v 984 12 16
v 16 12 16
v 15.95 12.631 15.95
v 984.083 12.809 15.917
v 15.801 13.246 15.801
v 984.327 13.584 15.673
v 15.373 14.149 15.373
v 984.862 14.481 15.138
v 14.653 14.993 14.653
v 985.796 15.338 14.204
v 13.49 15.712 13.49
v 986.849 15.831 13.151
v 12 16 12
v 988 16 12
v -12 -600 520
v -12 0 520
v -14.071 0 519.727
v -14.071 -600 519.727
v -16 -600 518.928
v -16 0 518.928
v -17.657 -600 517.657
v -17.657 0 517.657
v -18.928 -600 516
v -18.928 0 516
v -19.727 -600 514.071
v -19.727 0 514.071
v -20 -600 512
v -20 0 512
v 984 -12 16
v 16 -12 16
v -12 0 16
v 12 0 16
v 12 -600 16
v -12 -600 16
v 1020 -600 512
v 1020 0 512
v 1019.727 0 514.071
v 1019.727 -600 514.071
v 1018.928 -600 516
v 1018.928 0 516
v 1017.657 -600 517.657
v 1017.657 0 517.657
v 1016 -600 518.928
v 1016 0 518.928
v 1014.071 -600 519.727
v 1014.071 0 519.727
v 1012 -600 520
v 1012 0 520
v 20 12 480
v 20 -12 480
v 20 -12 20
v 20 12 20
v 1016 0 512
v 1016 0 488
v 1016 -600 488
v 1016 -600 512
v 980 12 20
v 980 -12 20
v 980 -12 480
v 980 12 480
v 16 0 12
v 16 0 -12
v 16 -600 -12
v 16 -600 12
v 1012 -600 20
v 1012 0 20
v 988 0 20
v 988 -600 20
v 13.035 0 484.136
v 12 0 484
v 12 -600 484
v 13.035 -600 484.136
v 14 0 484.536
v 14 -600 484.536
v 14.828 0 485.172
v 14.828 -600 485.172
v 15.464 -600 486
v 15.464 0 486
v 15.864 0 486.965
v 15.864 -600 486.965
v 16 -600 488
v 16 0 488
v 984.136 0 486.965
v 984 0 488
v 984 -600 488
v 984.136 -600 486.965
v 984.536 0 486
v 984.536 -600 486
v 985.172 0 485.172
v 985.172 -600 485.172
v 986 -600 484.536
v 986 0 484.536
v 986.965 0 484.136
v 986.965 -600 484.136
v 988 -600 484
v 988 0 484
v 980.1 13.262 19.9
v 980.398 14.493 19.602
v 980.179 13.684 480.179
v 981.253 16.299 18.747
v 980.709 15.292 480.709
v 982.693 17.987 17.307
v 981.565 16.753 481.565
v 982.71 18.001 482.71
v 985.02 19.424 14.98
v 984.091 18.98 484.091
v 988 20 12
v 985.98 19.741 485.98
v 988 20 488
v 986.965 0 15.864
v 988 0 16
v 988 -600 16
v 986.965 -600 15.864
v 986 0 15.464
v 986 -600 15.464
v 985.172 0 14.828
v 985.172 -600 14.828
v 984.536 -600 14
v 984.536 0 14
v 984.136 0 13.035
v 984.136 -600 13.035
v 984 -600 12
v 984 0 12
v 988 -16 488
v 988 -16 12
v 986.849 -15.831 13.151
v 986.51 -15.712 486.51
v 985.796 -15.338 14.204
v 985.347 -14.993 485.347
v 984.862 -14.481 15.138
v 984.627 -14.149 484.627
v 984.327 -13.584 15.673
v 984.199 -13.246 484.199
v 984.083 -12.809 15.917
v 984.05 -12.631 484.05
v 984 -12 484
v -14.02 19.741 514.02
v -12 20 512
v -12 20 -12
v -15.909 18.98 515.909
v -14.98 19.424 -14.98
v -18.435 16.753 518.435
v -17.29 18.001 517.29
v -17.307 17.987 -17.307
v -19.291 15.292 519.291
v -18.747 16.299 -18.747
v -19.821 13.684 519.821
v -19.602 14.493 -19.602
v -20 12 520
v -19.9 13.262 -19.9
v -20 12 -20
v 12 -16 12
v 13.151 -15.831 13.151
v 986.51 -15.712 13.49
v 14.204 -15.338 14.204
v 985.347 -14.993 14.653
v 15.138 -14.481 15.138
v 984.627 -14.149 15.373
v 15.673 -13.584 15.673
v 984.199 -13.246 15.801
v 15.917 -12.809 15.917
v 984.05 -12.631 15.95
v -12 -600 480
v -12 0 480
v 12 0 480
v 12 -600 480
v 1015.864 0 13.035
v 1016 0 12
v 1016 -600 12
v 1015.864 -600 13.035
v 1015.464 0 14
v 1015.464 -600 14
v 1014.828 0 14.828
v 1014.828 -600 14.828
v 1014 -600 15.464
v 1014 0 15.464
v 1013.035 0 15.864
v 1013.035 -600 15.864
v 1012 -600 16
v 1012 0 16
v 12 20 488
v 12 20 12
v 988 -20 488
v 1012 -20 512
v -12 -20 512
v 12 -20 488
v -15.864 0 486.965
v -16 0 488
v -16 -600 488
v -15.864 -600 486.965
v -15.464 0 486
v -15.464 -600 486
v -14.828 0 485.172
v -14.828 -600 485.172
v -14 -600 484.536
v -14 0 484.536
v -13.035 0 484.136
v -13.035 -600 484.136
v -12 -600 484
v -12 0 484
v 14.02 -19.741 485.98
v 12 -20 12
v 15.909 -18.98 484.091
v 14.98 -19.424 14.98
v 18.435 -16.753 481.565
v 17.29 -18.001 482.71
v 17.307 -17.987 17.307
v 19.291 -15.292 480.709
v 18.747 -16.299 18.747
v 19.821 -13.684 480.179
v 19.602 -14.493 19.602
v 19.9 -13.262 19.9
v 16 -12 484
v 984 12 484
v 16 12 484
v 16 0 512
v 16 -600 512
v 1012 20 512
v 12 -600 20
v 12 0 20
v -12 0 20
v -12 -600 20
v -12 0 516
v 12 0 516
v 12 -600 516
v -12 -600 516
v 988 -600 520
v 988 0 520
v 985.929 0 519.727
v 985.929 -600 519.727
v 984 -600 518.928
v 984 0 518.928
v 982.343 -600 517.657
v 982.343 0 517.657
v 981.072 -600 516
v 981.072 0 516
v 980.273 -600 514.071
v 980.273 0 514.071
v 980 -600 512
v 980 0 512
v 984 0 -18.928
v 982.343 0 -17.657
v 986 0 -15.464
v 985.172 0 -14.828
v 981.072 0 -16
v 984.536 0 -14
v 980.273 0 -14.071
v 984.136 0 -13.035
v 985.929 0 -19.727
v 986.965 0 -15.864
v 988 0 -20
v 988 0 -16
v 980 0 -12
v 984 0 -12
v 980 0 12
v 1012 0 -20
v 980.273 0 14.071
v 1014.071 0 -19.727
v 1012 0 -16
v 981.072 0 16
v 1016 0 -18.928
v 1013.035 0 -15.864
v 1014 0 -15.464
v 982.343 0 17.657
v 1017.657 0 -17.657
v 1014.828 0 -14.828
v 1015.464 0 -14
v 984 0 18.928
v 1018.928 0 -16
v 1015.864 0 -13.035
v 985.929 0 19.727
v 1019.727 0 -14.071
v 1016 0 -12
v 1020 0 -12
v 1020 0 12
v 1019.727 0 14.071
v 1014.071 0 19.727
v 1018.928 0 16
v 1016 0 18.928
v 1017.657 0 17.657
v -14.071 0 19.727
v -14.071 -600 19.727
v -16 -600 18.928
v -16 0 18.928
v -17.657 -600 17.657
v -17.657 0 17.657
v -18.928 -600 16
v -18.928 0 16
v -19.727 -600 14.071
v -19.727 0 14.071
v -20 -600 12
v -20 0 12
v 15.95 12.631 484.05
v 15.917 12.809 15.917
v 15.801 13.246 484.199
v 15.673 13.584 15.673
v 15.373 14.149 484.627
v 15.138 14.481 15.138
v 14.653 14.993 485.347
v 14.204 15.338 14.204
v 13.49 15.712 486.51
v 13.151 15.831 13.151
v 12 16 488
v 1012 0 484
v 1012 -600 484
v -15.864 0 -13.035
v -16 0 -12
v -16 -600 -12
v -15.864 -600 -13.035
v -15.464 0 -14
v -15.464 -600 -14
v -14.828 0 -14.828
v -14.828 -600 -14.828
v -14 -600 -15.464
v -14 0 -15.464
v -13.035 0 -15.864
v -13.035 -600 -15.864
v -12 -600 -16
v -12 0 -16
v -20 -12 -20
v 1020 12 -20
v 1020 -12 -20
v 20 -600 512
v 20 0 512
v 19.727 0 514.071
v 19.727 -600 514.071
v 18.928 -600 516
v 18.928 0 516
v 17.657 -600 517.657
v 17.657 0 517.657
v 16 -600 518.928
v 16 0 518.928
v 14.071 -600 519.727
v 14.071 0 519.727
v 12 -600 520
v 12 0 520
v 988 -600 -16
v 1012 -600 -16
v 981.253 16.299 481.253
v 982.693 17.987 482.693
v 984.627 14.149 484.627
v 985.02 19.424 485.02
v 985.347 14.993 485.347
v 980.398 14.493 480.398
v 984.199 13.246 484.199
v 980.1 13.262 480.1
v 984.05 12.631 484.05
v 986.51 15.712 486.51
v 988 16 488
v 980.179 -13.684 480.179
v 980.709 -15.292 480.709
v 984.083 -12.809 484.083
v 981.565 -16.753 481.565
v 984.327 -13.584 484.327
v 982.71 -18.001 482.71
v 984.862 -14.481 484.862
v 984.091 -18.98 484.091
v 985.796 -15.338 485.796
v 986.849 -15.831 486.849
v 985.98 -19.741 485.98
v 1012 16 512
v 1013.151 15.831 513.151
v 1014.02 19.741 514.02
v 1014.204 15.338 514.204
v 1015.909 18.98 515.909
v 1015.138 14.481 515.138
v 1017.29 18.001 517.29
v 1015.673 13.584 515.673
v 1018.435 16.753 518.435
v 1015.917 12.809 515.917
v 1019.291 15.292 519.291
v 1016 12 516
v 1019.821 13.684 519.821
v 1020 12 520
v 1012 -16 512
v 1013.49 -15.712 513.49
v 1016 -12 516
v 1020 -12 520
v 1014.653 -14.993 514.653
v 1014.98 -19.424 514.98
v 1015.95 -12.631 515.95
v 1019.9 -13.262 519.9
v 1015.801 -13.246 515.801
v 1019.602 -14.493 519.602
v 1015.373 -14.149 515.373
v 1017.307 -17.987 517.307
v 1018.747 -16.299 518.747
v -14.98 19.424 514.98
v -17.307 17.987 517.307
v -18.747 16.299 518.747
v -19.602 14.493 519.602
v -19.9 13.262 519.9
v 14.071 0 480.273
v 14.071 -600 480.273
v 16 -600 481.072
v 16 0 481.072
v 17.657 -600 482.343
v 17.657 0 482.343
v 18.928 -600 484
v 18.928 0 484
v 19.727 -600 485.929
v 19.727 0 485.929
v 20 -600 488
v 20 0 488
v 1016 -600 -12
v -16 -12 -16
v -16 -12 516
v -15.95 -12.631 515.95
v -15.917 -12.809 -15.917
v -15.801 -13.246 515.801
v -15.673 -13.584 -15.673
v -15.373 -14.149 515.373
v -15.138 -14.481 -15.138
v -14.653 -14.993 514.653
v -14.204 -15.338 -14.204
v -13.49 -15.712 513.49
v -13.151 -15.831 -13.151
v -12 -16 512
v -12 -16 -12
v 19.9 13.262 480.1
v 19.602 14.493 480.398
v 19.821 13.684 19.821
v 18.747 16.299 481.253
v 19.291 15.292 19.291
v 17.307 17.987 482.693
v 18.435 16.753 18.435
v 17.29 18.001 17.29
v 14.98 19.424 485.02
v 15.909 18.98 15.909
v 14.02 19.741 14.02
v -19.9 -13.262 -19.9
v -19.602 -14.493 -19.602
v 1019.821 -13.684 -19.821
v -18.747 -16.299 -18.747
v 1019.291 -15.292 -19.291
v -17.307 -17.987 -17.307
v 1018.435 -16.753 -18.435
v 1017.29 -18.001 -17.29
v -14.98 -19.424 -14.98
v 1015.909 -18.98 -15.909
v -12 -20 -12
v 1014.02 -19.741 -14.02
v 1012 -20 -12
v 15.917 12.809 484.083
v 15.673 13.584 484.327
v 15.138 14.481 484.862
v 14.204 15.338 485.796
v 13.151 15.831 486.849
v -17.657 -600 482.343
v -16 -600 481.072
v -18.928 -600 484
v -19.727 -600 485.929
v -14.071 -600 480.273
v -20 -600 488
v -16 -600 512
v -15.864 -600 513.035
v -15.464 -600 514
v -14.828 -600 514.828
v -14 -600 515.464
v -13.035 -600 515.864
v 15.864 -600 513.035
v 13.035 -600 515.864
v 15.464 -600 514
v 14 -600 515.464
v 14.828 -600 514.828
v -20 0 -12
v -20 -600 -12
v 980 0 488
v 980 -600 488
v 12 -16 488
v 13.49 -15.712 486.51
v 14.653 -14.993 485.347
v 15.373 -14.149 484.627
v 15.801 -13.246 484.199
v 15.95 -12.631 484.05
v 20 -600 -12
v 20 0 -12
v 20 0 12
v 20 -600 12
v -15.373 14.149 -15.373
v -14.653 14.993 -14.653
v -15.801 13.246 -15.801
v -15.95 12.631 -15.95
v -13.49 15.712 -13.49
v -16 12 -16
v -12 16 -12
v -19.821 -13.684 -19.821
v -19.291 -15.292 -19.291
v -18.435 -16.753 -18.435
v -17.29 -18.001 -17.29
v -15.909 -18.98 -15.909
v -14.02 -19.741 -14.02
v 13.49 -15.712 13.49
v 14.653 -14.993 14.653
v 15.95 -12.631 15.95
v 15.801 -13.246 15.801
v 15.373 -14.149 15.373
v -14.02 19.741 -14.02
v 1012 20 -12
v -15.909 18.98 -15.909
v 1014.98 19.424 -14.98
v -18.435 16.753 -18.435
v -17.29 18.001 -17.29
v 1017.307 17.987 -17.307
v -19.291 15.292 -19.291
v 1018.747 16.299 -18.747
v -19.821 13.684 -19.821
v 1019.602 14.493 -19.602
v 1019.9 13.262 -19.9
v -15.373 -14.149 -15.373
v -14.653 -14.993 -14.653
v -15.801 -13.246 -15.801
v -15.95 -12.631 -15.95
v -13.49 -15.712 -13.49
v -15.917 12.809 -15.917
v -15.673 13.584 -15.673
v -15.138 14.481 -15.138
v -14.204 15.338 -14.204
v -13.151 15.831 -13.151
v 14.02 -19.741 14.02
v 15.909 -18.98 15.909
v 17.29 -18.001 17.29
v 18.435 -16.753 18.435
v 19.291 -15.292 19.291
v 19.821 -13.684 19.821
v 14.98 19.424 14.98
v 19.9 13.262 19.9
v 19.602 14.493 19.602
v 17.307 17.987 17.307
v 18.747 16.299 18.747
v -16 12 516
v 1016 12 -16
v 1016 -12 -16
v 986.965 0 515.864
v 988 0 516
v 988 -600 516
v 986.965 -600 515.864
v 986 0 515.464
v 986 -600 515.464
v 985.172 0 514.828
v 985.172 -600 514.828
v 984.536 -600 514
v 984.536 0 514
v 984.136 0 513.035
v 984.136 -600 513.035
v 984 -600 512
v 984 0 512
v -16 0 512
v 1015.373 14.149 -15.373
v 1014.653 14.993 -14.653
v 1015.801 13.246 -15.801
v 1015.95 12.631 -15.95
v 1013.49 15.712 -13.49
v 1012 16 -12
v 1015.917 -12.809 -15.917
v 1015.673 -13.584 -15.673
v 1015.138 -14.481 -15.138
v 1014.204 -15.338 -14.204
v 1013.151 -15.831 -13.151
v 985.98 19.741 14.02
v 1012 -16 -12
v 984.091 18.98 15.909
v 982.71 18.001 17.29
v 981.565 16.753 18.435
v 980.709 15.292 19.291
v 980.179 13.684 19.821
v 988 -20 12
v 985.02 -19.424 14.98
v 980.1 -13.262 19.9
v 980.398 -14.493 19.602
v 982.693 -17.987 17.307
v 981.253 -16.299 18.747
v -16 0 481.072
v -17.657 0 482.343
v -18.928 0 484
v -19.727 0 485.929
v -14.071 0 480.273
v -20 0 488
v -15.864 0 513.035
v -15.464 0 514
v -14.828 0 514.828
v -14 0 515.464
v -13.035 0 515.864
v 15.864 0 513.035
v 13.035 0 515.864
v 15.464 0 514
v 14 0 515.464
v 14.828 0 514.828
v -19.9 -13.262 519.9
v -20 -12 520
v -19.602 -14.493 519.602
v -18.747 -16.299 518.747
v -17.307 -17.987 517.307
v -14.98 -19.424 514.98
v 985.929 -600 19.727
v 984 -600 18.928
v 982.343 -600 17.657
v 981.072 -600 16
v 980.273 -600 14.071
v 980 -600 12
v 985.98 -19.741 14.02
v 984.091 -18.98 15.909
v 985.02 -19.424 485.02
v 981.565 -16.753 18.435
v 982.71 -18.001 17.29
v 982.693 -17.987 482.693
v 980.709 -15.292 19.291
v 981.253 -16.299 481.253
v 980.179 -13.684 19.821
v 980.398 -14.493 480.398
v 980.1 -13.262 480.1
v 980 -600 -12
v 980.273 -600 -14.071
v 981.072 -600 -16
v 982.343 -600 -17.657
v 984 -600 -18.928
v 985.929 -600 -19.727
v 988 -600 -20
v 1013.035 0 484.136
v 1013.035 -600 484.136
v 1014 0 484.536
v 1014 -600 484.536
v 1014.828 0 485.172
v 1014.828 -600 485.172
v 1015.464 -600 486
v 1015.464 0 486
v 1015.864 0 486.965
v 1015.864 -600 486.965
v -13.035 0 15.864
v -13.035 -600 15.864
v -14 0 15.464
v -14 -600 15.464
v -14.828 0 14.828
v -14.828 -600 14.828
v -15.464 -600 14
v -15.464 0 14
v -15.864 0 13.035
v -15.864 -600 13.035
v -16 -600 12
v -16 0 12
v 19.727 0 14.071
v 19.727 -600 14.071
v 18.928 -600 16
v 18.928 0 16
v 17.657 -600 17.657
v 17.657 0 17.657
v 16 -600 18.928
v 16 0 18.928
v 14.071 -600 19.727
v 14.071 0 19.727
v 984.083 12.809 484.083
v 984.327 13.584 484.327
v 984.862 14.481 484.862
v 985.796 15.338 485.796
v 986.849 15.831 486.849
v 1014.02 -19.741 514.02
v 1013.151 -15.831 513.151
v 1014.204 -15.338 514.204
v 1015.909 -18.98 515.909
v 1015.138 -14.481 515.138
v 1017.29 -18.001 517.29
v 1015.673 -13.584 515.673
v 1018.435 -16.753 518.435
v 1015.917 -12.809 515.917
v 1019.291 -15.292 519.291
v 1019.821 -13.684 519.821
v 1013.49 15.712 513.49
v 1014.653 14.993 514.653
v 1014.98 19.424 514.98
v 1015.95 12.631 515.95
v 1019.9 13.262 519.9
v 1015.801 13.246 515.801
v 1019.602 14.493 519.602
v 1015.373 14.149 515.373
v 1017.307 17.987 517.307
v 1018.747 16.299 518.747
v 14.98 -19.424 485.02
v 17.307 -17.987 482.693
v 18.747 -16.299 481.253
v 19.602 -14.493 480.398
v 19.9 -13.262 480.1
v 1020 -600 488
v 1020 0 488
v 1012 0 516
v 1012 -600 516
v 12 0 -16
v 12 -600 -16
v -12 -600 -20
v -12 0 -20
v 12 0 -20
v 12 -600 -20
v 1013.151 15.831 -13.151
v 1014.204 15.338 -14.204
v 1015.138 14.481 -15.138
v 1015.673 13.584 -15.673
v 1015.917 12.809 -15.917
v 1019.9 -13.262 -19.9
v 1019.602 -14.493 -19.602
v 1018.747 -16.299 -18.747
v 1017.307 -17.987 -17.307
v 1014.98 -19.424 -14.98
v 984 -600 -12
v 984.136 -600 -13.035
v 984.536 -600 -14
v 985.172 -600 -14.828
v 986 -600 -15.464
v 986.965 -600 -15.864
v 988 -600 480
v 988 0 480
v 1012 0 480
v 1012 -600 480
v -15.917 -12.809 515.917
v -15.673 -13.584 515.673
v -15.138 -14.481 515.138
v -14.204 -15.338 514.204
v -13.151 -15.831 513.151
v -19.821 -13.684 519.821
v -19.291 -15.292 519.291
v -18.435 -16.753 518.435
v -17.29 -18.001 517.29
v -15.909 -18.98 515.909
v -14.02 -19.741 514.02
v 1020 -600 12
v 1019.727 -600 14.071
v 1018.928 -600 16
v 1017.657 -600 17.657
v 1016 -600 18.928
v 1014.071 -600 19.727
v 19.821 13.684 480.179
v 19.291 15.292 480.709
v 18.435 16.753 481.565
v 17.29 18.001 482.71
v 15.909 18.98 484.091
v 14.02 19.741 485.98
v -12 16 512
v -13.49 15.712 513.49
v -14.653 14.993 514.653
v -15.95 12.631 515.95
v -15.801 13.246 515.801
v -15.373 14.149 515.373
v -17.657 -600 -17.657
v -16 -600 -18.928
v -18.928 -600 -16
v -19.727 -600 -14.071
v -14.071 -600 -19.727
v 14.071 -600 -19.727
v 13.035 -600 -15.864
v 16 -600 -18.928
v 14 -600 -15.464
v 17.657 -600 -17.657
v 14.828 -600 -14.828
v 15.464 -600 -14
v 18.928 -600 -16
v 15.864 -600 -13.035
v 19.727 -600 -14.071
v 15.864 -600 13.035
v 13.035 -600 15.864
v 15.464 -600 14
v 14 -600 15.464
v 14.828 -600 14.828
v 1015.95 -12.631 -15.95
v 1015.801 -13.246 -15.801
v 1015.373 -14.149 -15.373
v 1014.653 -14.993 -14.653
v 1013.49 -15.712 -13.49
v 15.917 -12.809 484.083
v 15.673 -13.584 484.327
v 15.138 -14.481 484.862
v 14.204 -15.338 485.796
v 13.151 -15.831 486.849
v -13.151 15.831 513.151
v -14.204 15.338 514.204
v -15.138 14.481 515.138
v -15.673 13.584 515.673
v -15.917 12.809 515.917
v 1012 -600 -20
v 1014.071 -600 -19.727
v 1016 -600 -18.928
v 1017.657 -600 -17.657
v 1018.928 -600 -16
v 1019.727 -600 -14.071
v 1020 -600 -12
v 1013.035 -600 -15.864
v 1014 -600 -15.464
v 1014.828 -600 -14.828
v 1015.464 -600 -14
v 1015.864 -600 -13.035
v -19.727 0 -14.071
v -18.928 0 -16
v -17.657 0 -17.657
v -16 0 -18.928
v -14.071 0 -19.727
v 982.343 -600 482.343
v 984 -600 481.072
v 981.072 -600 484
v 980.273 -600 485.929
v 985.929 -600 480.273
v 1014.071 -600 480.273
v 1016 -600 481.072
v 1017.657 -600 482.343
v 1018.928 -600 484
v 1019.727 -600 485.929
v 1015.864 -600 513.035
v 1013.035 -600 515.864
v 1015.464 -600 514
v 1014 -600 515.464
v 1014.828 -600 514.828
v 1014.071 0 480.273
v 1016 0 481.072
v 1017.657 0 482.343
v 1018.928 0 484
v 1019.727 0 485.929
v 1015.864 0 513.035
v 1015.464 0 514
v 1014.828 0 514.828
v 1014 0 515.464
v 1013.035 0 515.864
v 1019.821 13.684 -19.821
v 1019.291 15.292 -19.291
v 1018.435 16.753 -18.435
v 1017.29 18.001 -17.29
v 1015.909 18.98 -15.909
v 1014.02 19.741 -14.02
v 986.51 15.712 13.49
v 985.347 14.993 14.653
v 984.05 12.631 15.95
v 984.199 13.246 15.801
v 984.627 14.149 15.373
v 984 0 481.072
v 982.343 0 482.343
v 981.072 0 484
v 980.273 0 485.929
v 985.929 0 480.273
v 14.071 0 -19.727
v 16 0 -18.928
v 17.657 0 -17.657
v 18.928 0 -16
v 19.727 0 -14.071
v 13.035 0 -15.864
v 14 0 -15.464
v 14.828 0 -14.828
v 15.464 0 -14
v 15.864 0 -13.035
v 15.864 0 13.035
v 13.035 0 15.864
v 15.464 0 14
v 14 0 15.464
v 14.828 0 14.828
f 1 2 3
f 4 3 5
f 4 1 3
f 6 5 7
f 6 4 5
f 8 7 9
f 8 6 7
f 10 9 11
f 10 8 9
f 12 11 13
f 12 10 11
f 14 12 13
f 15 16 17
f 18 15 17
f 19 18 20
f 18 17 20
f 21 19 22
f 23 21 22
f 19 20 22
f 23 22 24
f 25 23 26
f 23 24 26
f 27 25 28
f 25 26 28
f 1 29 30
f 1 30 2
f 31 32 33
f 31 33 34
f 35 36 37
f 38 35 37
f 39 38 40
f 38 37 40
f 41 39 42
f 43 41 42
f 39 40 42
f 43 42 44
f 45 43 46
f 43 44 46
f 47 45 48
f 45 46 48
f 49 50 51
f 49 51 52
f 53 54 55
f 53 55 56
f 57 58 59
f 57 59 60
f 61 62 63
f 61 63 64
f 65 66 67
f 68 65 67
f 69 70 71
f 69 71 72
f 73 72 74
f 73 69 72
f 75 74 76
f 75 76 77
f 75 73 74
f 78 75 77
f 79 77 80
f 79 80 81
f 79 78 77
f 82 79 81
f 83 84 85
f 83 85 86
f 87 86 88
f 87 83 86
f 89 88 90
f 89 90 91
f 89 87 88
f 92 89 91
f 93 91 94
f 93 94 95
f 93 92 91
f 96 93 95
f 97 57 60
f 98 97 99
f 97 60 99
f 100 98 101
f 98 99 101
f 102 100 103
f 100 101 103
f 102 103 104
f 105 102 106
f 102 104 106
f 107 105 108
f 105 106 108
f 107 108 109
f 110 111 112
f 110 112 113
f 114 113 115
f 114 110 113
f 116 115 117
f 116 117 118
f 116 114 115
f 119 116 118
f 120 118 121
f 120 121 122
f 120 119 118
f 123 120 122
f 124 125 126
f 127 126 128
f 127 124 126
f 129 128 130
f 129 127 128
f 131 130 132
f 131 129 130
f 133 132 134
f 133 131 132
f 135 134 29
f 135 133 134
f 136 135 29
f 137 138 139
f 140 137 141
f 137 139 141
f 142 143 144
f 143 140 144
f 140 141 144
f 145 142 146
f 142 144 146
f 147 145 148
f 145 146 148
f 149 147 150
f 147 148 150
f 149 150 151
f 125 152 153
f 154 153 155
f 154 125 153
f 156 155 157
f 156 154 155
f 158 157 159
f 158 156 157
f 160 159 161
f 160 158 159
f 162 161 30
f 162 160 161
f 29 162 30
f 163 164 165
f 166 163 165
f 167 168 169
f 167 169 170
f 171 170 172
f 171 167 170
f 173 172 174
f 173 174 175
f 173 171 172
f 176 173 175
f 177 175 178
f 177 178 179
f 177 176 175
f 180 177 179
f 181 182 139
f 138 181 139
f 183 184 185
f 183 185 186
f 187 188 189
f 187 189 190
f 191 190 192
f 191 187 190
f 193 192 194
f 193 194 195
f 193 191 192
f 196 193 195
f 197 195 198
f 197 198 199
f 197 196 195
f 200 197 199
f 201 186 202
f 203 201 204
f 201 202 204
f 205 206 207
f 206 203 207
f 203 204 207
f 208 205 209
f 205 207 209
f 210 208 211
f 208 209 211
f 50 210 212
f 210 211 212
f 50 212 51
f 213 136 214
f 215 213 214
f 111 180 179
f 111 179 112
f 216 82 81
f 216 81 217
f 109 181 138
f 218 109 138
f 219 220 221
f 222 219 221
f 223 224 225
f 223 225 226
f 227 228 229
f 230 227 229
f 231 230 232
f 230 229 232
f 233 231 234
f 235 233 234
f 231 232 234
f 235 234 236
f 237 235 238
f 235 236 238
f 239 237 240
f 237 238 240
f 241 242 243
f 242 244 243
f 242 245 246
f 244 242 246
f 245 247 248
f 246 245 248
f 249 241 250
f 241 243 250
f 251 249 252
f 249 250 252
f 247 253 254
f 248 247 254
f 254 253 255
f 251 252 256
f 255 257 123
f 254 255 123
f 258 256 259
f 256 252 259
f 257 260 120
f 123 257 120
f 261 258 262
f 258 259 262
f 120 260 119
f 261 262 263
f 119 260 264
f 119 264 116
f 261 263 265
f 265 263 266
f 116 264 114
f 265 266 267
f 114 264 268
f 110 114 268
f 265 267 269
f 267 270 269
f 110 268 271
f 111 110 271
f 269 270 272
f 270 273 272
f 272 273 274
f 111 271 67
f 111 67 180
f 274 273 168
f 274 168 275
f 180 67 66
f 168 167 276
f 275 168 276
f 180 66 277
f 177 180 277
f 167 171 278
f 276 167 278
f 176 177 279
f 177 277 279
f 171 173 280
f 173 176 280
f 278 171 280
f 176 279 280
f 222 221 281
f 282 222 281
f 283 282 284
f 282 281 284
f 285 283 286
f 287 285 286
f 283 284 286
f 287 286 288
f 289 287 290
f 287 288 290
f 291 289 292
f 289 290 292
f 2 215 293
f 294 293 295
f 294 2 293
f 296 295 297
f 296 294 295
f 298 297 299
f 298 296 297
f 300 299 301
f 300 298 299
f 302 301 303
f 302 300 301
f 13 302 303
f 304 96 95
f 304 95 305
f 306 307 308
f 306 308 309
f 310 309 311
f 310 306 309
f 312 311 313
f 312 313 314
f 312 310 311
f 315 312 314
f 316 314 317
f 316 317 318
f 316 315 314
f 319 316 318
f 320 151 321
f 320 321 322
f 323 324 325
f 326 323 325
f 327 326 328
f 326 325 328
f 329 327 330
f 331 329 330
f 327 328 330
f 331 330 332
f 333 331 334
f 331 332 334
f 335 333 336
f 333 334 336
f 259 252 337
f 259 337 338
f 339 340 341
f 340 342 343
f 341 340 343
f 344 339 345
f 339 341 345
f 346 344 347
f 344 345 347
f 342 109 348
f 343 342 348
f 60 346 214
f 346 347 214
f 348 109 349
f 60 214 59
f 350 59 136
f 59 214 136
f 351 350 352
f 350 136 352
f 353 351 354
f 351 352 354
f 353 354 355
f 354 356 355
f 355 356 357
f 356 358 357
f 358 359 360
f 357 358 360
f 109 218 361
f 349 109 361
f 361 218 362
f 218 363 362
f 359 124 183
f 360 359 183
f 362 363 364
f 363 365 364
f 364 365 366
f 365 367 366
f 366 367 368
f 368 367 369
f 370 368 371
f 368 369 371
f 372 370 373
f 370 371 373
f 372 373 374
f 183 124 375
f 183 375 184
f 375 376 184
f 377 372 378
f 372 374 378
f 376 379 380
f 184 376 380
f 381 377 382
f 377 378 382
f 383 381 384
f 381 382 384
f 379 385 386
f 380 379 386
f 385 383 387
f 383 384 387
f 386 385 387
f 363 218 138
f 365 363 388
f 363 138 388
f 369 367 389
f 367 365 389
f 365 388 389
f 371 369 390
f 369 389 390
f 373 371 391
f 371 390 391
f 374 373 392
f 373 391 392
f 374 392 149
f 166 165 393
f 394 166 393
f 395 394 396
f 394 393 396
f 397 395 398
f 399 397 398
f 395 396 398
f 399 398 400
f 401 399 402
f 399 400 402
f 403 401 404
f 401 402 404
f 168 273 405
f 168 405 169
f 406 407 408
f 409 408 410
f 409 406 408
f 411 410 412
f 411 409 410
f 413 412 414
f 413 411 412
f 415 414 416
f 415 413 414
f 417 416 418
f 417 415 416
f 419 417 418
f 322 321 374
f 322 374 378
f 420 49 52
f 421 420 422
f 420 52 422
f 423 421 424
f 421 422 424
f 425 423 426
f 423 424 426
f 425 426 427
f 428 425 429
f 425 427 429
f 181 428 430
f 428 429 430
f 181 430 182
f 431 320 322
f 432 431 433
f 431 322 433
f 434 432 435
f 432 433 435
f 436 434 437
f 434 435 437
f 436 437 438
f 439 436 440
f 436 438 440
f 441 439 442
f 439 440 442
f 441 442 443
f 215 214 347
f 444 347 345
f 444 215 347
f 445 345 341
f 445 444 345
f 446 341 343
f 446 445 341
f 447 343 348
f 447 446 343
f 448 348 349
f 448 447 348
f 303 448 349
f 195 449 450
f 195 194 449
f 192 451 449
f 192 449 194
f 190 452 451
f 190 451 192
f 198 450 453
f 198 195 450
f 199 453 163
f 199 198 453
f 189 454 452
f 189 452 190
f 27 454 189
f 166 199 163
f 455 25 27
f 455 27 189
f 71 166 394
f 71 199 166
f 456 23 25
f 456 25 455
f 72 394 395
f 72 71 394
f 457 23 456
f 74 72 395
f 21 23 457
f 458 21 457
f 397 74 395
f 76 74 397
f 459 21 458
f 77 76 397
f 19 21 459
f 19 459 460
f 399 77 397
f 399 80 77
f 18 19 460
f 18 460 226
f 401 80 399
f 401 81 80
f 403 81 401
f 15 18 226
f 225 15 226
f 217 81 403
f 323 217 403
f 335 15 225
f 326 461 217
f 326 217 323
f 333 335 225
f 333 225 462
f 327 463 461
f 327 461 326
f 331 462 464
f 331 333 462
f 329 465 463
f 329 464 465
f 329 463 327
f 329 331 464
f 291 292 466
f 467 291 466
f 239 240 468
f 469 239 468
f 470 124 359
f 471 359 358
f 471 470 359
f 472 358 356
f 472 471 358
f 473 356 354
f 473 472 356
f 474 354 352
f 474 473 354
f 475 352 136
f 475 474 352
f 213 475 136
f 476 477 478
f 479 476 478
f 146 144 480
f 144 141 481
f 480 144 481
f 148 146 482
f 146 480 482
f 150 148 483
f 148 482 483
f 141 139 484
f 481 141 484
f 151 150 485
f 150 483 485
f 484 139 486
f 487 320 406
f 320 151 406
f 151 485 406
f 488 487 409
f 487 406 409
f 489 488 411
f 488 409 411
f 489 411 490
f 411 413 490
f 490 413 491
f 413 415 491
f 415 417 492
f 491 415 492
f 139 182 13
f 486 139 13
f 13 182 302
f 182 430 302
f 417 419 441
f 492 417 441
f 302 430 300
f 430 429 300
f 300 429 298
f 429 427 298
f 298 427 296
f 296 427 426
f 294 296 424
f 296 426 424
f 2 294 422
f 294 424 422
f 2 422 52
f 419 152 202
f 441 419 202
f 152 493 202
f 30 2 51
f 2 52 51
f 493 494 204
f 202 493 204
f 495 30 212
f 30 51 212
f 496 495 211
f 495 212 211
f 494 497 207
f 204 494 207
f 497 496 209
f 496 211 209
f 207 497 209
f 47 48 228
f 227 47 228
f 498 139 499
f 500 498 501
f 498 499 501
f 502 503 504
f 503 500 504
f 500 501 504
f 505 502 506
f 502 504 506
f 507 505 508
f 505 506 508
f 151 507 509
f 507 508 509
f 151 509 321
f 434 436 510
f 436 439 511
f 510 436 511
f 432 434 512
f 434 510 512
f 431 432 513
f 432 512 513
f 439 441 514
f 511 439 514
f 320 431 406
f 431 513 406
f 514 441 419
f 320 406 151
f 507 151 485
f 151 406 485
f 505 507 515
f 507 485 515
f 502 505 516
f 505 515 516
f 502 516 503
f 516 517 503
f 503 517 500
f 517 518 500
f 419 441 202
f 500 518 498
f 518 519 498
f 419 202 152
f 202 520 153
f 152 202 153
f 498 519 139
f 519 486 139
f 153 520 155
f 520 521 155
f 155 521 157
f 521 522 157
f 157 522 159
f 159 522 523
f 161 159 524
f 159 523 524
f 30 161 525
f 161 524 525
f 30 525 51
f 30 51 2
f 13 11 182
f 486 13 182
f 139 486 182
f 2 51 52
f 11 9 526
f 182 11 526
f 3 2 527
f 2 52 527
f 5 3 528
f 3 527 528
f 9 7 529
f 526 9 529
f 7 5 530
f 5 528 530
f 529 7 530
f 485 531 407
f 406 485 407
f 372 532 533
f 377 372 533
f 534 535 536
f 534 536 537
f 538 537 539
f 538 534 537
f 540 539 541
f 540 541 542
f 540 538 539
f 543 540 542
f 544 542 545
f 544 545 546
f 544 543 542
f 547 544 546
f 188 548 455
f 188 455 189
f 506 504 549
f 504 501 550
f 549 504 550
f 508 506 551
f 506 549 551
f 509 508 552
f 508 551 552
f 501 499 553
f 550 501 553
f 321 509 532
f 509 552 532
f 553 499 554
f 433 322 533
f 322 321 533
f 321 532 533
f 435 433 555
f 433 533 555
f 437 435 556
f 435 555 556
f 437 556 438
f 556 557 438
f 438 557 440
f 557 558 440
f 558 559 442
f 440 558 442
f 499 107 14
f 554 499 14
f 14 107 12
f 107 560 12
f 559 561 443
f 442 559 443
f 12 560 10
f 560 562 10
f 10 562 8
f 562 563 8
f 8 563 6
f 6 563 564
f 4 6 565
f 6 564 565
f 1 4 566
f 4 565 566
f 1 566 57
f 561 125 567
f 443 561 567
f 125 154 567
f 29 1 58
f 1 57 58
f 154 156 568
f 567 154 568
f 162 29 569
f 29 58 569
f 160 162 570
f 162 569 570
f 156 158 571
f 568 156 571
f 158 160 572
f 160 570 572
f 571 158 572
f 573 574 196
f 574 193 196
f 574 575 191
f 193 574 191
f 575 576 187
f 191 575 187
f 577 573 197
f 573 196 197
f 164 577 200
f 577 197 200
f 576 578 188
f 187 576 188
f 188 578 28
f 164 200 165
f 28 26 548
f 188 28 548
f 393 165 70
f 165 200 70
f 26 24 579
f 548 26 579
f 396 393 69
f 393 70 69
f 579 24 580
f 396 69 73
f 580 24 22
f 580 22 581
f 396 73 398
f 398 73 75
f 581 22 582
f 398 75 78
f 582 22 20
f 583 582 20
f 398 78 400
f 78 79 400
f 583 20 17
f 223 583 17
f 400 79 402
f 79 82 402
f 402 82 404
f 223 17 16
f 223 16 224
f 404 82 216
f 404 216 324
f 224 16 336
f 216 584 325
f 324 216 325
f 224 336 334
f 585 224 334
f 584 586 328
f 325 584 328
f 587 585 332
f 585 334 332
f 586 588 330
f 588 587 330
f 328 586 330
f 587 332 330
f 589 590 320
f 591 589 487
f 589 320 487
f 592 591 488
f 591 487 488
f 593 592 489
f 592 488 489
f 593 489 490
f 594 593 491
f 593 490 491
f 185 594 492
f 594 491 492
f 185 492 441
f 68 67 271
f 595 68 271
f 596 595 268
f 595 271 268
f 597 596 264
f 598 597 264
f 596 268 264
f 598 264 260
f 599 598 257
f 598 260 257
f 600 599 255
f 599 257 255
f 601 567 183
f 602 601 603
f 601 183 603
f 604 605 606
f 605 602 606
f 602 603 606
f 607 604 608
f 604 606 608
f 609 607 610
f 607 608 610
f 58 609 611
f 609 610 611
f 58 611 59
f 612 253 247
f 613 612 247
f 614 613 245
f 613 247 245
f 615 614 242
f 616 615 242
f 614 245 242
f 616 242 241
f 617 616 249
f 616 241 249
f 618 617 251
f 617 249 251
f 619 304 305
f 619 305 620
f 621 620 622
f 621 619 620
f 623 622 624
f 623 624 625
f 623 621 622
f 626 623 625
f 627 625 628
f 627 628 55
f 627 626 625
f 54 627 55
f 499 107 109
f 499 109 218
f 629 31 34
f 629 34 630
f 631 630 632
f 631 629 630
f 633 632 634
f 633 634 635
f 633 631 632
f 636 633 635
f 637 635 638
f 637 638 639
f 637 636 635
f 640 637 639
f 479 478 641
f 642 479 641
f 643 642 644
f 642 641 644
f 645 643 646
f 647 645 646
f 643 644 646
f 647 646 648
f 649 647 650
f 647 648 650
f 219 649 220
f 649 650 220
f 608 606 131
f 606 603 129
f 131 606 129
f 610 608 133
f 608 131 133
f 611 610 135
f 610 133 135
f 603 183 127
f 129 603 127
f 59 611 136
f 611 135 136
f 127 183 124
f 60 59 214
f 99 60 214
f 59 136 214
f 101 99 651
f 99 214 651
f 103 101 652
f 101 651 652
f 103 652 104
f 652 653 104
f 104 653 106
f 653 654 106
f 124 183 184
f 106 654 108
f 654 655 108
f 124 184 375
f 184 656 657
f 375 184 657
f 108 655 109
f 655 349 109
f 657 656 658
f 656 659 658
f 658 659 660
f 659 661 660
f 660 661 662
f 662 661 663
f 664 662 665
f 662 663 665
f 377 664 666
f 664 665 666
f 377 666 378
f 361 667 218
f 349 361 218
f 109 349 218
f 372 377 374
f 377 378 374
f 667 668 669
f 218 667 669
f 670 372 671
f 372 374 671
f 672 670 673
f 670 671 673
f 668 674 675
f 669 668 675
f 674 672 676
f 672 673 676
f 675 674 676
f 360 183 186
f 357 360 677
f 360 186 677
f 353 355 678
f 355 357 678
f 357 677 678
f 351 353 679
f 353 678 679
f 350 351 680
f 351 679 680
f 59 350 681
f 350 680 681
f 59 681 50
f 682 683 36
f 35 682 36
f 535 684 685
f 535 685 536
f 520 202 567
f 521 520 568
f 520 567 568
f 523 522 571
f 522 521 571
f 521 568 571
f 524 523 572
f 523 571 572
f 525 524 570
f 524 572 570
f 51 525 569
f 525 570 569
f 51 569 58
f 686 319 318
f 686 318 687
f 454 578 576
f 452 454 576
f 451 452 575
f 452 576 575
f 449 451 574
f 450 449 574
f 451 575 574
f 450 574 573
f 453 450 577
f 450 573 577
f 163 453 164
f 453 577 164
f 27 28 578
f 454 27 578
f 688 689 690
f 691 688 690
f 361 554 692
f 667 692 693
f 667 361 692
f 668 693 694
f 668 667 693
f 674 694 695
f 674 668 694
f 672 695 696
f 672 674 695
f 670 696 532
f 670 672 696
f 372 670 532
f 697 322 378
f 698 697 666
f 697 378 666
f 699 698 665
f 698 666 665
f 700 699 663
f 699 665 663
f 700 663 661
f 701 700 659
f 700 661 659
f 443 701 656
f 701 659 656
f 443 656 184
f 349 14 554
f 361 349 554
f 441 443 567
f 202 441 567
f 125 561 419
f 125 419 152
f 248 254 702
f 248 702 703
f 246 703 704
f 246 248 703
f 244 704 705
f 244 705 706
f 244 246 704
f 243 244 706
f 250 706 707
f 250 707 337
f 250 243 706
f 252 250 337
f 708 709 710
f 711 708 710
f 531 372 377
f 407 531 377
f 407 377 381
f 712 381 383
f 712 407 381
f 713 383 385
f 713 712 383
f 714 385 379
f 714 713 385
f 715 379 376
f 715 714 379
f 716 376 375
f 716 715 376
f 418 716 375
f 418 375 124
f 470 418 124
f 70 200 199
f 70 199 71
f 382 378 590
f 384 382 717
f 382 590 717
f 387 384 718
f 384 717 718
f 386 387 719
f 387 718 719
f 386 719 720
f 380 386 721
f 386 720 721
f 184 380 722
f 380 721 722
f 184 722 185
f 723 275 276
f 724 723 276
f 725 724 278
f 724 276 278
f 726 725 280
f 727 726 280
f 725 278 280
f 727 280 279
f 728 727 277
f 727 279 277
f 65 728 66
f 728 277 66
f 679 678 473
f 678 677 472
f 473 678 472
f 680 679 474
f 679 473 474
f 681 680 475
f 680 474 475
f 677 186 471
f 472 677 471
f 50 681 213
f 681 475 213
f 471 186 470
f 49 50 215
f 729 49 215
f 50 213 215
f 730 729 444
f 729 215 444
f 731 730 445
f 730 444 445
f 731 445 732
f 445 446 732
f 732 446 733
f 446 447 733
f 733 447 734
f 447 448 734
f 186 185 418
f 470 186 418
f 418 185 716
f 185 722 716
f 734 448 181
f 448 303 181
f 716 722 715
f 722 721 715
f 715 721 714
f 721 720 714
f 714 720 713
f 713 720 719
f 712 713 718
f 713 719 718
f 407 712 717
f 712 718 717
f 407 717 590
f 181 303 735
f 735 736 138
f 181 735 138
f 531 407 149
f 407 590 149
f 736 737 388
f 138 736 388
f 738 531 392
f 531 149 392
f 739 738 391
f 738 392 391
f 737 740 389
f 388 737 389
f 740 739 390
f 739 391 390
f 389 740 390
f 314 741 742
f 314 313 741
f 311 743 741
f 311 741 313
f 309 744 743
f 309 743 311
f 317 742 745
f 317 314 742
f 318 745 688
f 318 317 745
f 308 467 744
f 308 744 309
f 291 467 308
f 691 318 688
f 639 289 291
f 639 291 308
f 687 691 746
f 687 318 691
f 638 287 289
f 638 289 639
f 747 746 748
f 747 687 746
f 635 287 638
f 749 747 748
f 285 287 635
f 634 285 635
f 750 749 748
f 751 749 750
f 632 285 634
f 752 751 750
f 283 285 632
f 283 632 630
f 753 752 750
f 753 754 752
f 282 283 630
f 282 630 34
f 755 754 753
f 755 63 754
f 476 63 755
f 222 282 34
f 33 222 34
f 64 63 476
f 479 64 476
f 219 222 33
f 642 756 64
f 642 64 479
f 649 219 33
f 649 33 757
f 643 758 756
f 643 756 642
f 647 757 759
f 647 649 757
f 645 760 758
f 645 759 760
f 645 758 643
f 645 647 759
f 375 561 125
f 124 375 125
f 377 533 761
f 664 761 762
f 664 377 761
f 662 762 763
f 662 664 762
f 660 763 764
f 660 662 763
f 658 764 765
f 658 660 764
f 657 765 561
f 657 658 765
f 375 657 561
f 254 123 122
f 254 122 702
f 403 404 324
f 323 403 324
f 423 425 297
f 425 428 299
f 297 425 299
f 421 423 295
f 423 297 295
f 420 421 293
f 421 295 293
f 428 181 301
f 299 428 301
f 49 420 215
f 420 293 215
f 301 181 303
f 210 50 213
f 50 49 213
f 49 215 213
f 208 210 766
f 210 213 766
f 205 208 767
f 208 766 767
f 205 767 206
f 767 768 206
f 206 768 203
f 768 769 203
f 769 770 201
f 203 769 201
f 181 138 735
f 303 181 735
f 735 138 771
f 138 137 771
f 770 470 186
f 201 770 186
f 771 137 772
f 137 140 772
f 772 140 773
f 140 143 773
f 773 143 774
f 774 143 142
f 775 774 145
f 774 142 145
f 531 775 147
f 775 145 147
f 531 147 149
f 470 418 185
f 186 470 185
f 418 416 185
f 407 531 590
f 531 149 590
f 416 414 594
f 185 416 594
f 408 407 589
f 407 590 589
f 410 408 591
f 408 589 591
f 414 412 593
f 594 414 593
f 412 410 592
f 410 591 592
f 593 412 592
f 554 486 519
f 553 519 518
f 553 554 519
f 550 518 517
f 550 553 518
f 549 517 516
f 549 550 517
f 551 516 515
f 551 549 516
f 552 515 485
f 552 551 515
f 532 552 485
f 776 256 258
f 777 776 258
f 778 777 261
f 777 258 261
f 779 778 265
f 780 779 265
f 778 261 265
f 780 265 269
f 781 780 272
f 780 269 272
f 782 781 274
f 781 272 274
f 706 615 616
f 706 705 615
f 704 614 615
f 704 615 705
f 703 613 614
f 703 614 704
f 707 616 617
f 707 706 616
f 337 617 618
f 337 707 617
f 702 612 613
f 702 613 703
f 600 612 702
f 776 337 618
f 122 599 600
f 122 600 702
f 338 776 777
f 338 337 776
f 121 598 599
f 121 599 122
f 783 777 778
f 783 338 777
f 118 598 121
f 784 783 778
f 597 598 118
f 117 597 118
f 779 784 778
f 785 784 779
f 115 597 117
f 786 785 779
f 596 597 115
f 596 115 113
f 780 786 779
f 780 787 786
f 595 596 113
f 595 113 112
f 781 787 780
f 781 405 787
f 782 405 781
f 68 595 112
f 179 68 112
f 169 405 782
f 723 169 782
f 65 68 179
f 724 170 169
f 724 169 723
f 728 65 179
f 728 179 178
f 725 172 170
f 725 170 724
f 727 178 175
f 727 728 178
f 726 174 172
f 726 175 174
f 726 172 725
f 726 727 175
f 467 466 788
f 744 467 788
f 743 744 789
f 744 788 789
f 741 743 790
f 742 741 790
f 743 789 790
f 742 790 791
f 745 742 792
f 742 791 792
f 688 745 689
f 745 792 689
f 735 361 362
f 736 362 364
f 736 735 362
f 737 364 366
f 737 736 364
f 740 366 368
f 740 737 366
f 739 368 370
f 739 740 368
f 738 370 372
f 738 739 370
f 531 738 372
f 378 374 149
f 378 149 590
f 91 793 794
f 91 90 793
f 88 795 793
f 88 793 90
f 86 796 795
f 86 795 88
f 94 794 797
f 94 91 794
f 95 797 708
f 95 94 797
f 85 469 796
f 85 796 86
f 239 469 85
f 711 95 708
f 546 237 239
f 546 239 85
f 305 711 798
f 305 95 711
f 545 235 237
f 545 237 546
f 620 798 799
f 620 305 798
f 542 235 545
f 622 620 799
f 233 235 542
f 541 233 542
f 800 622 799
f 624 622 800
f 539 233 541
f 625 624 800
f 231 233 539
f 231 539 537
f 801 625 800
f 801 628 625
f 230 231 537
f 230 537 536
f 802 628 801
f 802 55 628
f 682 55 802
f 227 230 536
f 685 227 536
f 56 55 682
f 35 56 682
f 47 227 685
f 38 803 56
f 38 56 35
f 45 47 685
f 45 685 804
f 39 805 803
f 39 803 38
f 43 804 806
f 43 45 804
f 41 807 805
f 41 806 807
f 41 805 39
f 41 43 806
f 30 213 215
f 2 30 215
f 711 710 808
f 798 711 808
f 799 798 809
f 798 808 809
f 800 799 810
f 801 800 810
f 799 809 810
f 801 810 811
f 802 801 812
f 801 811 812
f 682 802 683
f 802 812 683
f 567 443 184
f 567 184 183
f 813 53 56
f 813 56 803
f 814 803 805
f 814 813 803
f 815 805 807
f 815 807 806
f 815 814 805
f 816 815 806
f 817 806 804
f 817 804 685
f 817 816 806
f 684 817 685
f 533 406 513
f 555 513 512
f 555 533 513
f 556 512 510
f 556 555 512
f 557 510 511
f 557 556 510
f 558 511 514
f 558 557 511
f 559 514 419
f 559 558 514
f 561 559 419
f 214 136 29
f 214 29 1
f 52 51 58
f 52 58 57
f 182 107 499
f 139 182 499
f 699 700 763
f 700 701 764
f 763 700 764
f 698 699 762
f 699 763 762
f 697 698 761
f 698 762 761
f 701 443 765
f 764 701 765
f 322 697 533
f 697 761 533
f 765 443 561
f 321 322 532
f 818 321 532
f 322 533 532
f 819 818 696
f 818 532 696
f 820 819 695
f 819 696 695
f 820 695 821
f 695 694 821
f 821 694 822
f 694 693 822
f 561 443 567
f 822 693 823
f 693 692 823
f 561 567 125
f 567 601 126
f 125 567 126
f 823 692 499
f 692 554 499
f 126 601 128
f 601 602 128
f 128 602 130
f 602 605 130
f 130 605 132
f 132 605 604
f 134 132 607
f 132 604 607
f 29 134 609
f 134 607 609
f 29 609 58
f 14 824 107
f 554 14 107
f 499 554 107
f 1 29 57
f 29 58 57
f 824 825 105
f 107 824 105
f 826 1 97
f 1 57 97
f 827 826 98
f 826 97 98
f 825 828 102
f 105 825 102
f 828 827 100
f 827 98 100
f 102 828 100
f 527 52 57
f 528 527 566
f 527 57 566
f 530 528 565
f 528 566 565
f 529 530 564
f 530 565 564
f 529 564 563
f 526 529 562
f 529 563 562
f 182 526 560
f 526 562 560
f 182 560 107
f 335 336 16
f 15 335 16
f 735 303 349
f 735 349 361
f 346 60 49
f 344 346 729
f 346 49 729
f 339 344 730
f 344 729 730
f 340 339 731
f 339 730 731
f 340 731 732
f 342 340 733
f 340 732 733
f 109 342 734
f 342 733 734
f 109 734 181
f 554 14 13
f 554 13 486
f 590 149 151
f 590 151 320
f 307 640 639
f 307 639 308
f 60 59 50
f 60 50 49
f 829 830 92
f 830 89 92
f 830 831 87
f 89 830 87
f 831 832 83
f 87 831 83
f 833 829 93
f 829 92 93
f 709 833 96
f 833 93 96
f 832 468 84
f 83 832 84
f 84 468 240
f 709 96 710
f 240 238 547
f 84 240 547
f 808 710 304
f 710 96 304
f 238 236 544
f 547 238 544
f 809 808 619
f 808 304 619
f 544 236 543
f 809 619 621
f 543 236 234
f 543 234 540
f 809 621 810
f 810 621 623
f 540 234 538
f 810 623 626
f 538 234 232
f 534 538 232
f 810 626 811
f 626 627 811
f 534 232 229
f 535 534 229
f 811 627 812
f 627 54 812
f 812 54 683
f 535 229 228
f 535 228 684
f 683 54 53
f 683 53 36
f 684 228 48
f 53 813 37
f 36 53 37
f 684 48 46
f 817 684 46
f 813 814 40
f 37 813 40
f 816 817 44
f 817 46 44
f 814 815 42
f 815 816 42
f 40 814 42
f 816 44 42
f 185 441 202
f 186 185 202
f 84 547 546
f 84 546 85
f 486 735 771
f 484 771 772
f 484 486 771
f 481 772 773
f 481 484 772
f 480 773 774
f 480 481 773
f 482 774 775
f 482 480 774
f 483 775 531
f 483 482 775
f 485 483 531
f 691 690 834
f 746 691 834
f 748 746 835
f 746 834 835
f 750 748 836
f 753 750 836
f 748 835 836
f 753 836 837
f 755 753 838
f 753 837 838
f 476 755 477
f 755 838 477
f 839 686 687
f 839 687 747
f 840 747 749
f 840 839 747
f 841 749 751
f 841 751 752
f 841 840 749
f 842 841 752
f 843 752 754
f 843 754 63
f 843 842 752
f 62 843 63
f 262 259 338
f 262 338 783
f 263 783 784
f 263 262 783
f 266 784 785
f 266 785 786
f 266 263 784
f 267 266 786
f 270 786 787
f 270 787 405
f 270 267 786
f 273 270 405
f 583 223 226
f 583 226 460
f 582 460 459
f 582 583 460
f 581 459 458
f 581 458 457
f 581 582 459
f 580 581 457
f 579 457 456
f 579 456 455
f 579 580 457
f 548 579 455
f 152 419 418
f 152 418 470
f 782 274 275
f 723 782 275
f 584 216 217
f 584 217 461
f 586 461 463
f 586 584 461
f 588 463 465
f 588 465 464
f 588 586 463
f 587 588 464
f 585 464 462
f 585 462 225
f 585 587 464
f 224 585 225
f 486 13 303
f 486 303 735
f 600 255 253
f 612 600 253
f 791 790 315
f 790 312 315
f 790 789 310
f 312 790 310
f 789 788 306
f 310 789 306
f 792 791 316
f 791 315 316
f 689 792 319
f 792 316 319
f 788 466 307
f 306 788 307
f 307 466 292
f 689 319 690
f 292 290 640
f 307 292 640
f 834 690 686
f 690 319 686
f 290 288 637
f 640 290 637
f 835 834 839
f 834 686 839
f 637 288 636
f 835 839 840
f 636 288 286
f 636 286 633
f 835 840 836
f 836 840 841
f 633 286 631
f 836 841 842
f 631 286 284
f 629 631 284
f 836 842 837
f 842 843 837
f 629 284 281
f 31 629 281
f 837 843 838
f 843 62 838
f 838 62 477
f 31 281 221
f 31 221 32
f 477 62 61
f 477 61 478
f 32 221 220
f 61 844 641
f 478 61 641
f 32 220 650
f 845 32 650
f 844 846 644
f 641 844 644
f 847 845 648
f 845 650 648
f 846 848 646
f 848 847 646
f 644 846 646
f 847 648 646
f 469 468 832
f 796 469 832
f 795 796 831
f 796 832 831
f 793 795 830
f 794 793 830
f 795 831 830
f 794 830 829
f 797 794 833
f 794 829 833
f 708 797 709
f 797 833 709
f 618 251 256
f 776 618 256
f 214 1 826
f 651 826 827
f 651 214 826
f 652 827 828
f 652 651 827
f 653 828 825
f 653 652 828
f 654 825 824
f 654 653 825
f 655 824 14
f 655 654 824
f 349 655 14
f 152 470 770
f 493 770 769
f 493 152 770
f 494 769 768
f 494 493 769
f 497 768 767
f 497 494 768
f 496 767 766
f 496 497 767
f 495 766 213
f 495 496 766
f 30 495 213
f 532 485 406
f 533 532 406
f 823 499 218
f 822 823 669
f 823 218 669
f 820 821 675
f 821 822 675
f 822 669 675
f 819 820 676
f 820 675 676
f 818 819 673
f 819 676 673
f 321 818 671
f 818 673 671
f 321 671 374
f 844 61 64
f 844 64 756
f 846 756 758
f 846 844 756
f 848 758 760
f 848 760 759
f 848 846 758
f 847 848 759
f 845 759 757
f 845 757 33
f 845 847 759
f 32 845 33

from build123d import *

# Parameters (mm, degrees)
SQUARE_TUBE_40_X_40_X_4_1_DEPTH      = 529.284271247
SQUARE_TUBE_40_X_40_X_4_1_DEPTH_BACK = 29.284271247
SQUARE_TUBE_40_X_40_X_4_1_2_DEPTH    = 1058.568542495
SQUARE_TUBE_40_X_40_X_4_1_3_DEPTH    = 558.568542495
SQUARE_TUBE_40_X_40_X_4_1_4_DEPTH    = 1058.568542495
SQUARE_TUBE_40_X_40_X_4_2_DEPTH      = 600
SQUARE_TUBE_40_X_40_X_4_2_2_DEPTH    = 600
SQUARE_TUBE_40_X_40_X_4_2_3_DEPTH    = 600
SQUARE_TUBE_40_X_40_X_4_2_4_DEPTH    = 600


with BuildPart() as part:
    # Sketch1 → Square tube 40 X 40 X 4(1) (new, two sides: drawn at the far end of the back side and taken through both)
    with BuildSketch(Plane.XY.offset(-SQUARE_TUBE_40_X_40_X_4_1_DEPTH_BACK)):
        with BuildLine():
            Line((-12, -20), (12, -20))
            ThreePointArc((12, -20), (17.656854249, -17.656854249), (20, -12))
            Line((20, -12), (20, 12))
            ThreePointArc((20, 12), (17.656854249, 17.656854249), (12, 20))
            Line((12, 20), (-12, 20))
            ThreePointArc((-12, 20), (-17.656854249, 17.656854249), (-20, 12))
            Line((-20, 12), (-20, -12))
            ThreePointArc((-20, -12), (-17.656854249, -17.656854249), (-12, -20))
        make_face()
        with BuildLine():
            Line((-12, -16), (12, -16))
            ThreePointArc((12, -16), (14.828427125, -14.828427125), (16, -12))
            Line((16, -12), (16, 12))
            ThreePointArc((16, 12), (14.828427125, 14.828427125), (12, 16))
            Line((12, 16), (-12, 16))
            ThreePointArc((-12, 16), (-14.828427125, 14.828427125), (-16, 12))
            Line((-16, 12), (-16, -12))
            ThreePointArc((-16, -12), (-14.828427125, -14.828427125), (-12, -16))
        make_face(mode=Mode.SUBTRACT)
    extrude(amount=SQUARE_TUBE_40_X_40_X_4_1_DEPTH + SQUARE_TUBE_40_X_40_X_4_1_DEPTH_BACK)

    # Square tube 40 X 40 X 4(1) mitre 1
    split(bisect_by=Plane(origin=(0, 0, 0), x_dir=(0, -1, 0), z_dir=(-0.707106781, 0, 0.707106781)), keep=Keep.TOP)

    # Square tube 40 X 40 X 4(1) mitre 2
    split(bisect_by=Plane(origin=(0, 0, 500), x_dir=(0, -1, 0), z_dir=(-0.707106781, 0, -0.707106781)), keep=Keep.TOP)


with BuildPart() as body_2:
    # Sketch1 on segment 2 (carried to segment 2) → Square tube 40 X 40 X 4_1 2 (new body)
    with BuildSketch(Plane(origin=(-29.284271247, 0, 500), x_dir=(0, 0, -1), z_dir=(1, 0, 0))):
        with BuildLine():
            Line((-12, -20), (12, -20))
            ThreePointArc((12, -20), (17.656854249, -17.656854249), (20, -12))
            Line((20, -12), (20, 12))
            ThreePointArc((20, 12), (17.656854249, 17.656854249), (12, 20))
            Line((12, 20), (-12, 20))
            ThreePointArc((-12, 20), (-17.656854249, 17.656854249), (-20, 12))
            Line((-20, 12), (-20, -12))
            ThreePointArc((-20, -12), (-17.656854249, -17.656854249), (-12, -20))
        make_face()
        with BuildLine():
            Line((-12, -16), (12, -16))
            ThreePointArc((12, -16), (14.828427125, -14.828427125), (16, -12))
            Line((16, -12), (16, 12))
            ThreePointArc((16, 12), (14.828427125, 14.828427125), (12, 16))
            Line((12, 16), (-12, 16))
            ThreePointArc((-12, 16), (-14.828427125, 14.828427125), (-16, 12))
            Line((-16, 12), (-16, -12))
            ThreePointArc((-16, -12), (-14.828427125, -14.828427125), (-12, -16))
        make_face(mode=Mode.SUBTRACT)
    extrude(amount=SQUARE_TUBE_40_X_40_X_4_1_2_DEPTH)

    # Square tube 40 X 40 X 4_1 2 mitre 1
    split(bisect_by=Plane(origin=(0, 0, 500), x_dir=(0, 1, 0), z_dir=(0.707106781, 0, 0.707106781)), keep=Keep.TOP)

    # Square tube 40 X 40 X 4_1 2 mitre 2
    split(bisect_by=Plane(origin=(1000, 0, 500), x_dir=(0, -1, 0), z_dir=(-0.707106781, 0, 0.707106781)), keep=Keep.TOP)


with BuildPart() as body_3:
    # Sketch1 on segment 3 (carried to segment 3) → Square tube 40 X 40 X 4_1 3 (new body)
    with BuildSketch(Plane(origin=(1000, 0, 529.284271247), x_dir=(-1, 0, 0), z_dir=(0, 0, -1))):
        with BuildLine():
            Line((-12, -20), (12, -20))
            ThreePointArc((12, -20), (17.656854249, -17.656854249), (20, -12))
            Line((20, -12), (20, 12))
            ThreePointArc((20, 12), (17.656854249, 17.656854249), (12, 20))
            Line((12, 20), (-12, 20))
            ThreePointArc((-12, 20), (-17.656854249, 17.656854249), (-20, 12))
            Line((-20, 12), (-20, -12))
            ThreePointArc((-20, -12), (-17.656854249, -17.656854249), (-12, -20))
        make_face()
        with BuildLine():
            Line((-12, -16), (12, -16))
            ThreePointArc((12, -16), (14.828427125, -14.828427125), (16, -12))
            Line((16, -12), (16, 12))
            ThreePointArc((16, 12), (14.828427125, 14.828427125), (12, 16))
            Line((12, 16), (-12, 16))
            ThreePointArc((-12, 16), (-14.828427125, 14.828427125), (-16, 12))
            Line((-16, 12), (-16, -12))
            ThreePointArc((-16, -12), (-14.828427125, -14.828427125), (-12, -16))
        make_face(mode=Mode.SUBTRACT)
    extrude(amount=SQUARE_TUBE_40_X_40_X_4_1_3_DEPTH)

    # Square tube 40 X 40 X 4_1 3 mitre 1
    split(bisect_by=Plane(origin=(1000, 0, 0), x_dir=(0, 1, 0), z_dir=(0.707106781, 0, 0.707106781)), keep=Keep.TOP)

    # Square tube 40 X 40 X 4_1 3 mitre 2
    split(bisect_by=Plane(origin=(1000, 0, 500), x_dir=(0, 1, 0), z_dir=(0.707106781, 0, -0.707106781)), keep=Keep.TOP)


with BuildPart() as body_4:
    # Sketch1 on segment 4 (carried to segment 4) → Square tube 40 X 40 X 4_1 4 (new body)
    with BuildSketch(Plane.ZY.offset(-1029.284271247)):
        with BuildLine():
            Line((-12, -20), (12, -20))
            ThreePointArc((12, -20), (17.656854249, -17.656854249), (20, -12))
            Line((20, -12), (20, 12))
            ThreePointArc((20, 12), (17.656854249, 17.656854249), (12, 20))
            Line((12, 20), (-12, 20))
            ThreePointArc((-12, 20), (-17.656854249, 17.656854249), (-20, 12))
            Line((-20, 12), (-20, -12))
            ThreePointArc((-20, -12), (-17.656854249, -17.656854249), (-12, -20))
        make_face()
        with BuildLine():
            Line((-12, -16), (12, -16))
            ThreePointArc((12, -16), (14.828427125, -14.828427125), (16, -12))
            Line((16, -12), (16, 12))
            ThreePointArc((16, 12), (14.828427125, 14.828427125), (12, 16))
            Line((12, 16), (-12, 16))
            ThreePointArc((-12, 16), (-14.828427125, 14.828427125), (-16, 12))
            Line((-16, 12), (-16, -12))
            ThreePointArc((-16, -12), (-14.828427125, -14.828427125), (-12, -16))
        make_face(mode=Mode.SUBTRACT)
    extrude(amount=SQUARE_TUBE_40_X_40_X_4_1_4_DEPTH)

    # Square tube 40 X 40 X 4_1 4 mitre 1
    split(bisect_by=Plane(origin=(0, 0, 0), x_dir=(0, 1, 0), z_dir=(0.707106781, 0, -0.707106781)), keep=Keep.TOP)

    # Square tube 40 X 40 X 4_1 4 mitre 2
    split(bisect_by=Plane(origin=(1000, 0, 0), x_dir=(0, -1, 0), z_dir=(-0.707106781, 0, -0.707106781)), keep=Keep.TOP)


with BuildPart() as body_5:
    # Sketch11 → Square tube 40 X 40 X 4(2) (new body)
    with BuildSketch(Plane(origin=(0, 0, 500), x_dir=(1, 0, 0), z_dir=(0, -1, 0))):
        with BuildLine():
            Line((-12, -20), (12, -20))
            ThreePointArc((12, -20), (17.656854249, -17.656854249), (20, -12))
            Line((20, -12), (20, 12))
            ThreePointArc((20, 12), (17.656854249, 17.656854249), (12, 20))
            Line((12, 20), (-12, 20))
            ThreePointArc((-12, 20), (-17.656854249, 17.656854249), (-20, 12))
            Line((-20, 12), (-20, -12))
            ThreePointArc((-20, -12), (-17.656854249, -17.656854249), (-12, -20))
        make_face()
        with BuildLine():
            Line((-12, -16), (12, -16))
            ThreePointArc((12, -16), (14.828427125, -14.828427125), (16, -12))
            Line((16, -12), (16, 12))
            ThreePointArc((16, 12), (14.828427125, 14.828427125), (12, 16))
            Line((12, 16), (-12, 16))
            ThreePointArc((-12, 16), (-14.828427125, 14.828427125), (-16, 12))
            Line((-16, 12), (-16, -12))
            ThreePointArc((-16, -12), (-14.828427125, -14.828427125), (-12, -16))
        make_face(mode=Mode.SUBTRACT)
    extrude(amount=SQUARE_TUBE_40_X_40_X_4_2_DEPTH)


with BuildPart() as body_6:
    # Sketch11 on segment 2 (carried to segment 2) → Square tube 40 X 40 X 4_2 2 (new body)
    with BuildSketch(Plane(origin=(1000, 0, 500), x_dir=(1, 0, 0), z_dir=(0, -1, 0))):
        with BuildLine():
            Line((-12, -20), (12, -20))
            ThreePointArc((12, -20), (17.656854249, -17.656854249), (20, -12))
            Line((20, -12), (20, 12))
            ThreePointArc((20, 12), (17.656854249, 17.656854249), (12, 20))
            Line((12, 20), (-12, 20))
            ThreePointArc((-12, 20), (-17.656854249, 17.656854249), (-20, 12))
            Line((-20, 12), (-20, -12))
            ThreePointArc((-20, -12), (-17.656854249, -17.656854249), (-12, -20))
        make_face()
        with BuildLine():
            Line((-12, -16), (12, -16))
            ThreePointArc((12, -16), (14.828427125, -14.828427125), (16, -12))
            Line((16, -12), (16, 12))
            ThreePointArc((16, 12), (14.828427125, 14.828427125), (12, 16))
            Line((12, 16), (-12, 16))
            ThreePointArc((-12, 16), (-14.828427125, 14.828427125), (-16, 12))
            Line((-16, 12), (-16, -12))
            ThreePointArc((-16, -12), (-14.828427125, -14.828427125), (-12, -16))
        make_face(mode=Mode.SUBTRACT)
    extrude(amount=SQUARE_TUBE_40_X_40_X_4_2_2_DEPTH)


with BuildPart() as body_7:
    # Sketch11 on segment 3 (carried to segment 3) → Square tube 40 X 40 X 4_2 3 (new body)
    with BuildSketch(Plane(origin=(1000, 0, 0), x_dir=(1, 0, 0), z_dir=(0, -1, 0))):
        with BuildLine():
            Line((-12, -20), (12, -20))
            ThreePointArc((12, -20), (17.656854249, -17.656854249), (20, -12))
            Line((20, -12), (20, 12))
            ThreePointArc((20, 12), (17.656854249, 17.656854249), (12, 20))
            Line((12, 20), (-12, 20))
            ThreePointArc((-12, 20), (-17.656854249, 17.656854249), (-20, 12))
            Line((-20, 12), (-20, -12))
            ThreePointArc((-20, -12), (-17.656854249, -17.656854249), (-12, -20))
        make_face()
        with BuildLine():
            Line((-12, -16), (12, -16))
            ThreePointArc((12, -16), (14.828427125, -14.828427125), (16, -12))
            Line((16, -12), (16, 12))
            ThreePointArc((16, 12), (14.828427125, 14.828427125), (12, 16))
            Line((12, 16), (-12, 16))
            ThreePointArc((-12, 16), (-14.828427125, 14.828427125), (-16, 12))
            Line((-16, 12), (-16, -12))
            ThreePointArc((-16, -12), (-14.828427125, -14.828427125), (-12, -16))
        make_face(mode=Mode.SUBTRACT)
    extrude(amount=SQUARE_TUBE_40_X_40_X_4_2_3_DEPTH)


with BuildPart() as body_8:
    # Sketch11 on segment 4 (carried to segment 4) → Square tube 40 X 40 X 4_2 4 (new body)
    with BuildSketch(Plane.XZ):
        with BuildLine():
            Line((-12, -20), (12, -20))
            ThreePointArc((12, -20), (17.656854249, -17.656854249), (20, -12))
            Line((20, -12), (20, 12))
            ThreePointArc((20, 12), (17.656854249, 17.656854249), (12, 20))
            Line((12, 20), (-12, 20))
            ThreePointArc((-12, 20), (-17.656854249, 17.656854249), (-20, 12))
            Line((-20, 12), (-20, -12))
            ThreePointArc((-20, -12), (-17.656854249, -17.656854249), (-12, -20))
        make_face()
        with BuildLine():
            Line((-12, -16), (12, -16))
            ThreePointArc((12, -16), (14.828427125, -14.828427125), (16, -12))
            Line((16, -12), (16, 12))
            ThreePointArc((16, 12), (14.828427125, 14.828427125), (12, 16))
            Line((12, 16), (-12, 16))
            ThreePointArc((-12, 16), (-14.828427125, 14.828427125), (-16, 12))
            Line((-16, 12), (-16, -12))
            ThreePointArc((-16, -12), (-14.828427125, -14.828427125), (-12, -16))
        make_face(mode=Mode.SUBTRACT)
    extrude(amount=SQUARE_TUBE_40_X_40_X_4_2_4_DEPTH)


solid = Compound([part.part, body_2.part, body_3.part, body_4.part, body_5.part, body_6.part, body_7.part, body_8.part])
